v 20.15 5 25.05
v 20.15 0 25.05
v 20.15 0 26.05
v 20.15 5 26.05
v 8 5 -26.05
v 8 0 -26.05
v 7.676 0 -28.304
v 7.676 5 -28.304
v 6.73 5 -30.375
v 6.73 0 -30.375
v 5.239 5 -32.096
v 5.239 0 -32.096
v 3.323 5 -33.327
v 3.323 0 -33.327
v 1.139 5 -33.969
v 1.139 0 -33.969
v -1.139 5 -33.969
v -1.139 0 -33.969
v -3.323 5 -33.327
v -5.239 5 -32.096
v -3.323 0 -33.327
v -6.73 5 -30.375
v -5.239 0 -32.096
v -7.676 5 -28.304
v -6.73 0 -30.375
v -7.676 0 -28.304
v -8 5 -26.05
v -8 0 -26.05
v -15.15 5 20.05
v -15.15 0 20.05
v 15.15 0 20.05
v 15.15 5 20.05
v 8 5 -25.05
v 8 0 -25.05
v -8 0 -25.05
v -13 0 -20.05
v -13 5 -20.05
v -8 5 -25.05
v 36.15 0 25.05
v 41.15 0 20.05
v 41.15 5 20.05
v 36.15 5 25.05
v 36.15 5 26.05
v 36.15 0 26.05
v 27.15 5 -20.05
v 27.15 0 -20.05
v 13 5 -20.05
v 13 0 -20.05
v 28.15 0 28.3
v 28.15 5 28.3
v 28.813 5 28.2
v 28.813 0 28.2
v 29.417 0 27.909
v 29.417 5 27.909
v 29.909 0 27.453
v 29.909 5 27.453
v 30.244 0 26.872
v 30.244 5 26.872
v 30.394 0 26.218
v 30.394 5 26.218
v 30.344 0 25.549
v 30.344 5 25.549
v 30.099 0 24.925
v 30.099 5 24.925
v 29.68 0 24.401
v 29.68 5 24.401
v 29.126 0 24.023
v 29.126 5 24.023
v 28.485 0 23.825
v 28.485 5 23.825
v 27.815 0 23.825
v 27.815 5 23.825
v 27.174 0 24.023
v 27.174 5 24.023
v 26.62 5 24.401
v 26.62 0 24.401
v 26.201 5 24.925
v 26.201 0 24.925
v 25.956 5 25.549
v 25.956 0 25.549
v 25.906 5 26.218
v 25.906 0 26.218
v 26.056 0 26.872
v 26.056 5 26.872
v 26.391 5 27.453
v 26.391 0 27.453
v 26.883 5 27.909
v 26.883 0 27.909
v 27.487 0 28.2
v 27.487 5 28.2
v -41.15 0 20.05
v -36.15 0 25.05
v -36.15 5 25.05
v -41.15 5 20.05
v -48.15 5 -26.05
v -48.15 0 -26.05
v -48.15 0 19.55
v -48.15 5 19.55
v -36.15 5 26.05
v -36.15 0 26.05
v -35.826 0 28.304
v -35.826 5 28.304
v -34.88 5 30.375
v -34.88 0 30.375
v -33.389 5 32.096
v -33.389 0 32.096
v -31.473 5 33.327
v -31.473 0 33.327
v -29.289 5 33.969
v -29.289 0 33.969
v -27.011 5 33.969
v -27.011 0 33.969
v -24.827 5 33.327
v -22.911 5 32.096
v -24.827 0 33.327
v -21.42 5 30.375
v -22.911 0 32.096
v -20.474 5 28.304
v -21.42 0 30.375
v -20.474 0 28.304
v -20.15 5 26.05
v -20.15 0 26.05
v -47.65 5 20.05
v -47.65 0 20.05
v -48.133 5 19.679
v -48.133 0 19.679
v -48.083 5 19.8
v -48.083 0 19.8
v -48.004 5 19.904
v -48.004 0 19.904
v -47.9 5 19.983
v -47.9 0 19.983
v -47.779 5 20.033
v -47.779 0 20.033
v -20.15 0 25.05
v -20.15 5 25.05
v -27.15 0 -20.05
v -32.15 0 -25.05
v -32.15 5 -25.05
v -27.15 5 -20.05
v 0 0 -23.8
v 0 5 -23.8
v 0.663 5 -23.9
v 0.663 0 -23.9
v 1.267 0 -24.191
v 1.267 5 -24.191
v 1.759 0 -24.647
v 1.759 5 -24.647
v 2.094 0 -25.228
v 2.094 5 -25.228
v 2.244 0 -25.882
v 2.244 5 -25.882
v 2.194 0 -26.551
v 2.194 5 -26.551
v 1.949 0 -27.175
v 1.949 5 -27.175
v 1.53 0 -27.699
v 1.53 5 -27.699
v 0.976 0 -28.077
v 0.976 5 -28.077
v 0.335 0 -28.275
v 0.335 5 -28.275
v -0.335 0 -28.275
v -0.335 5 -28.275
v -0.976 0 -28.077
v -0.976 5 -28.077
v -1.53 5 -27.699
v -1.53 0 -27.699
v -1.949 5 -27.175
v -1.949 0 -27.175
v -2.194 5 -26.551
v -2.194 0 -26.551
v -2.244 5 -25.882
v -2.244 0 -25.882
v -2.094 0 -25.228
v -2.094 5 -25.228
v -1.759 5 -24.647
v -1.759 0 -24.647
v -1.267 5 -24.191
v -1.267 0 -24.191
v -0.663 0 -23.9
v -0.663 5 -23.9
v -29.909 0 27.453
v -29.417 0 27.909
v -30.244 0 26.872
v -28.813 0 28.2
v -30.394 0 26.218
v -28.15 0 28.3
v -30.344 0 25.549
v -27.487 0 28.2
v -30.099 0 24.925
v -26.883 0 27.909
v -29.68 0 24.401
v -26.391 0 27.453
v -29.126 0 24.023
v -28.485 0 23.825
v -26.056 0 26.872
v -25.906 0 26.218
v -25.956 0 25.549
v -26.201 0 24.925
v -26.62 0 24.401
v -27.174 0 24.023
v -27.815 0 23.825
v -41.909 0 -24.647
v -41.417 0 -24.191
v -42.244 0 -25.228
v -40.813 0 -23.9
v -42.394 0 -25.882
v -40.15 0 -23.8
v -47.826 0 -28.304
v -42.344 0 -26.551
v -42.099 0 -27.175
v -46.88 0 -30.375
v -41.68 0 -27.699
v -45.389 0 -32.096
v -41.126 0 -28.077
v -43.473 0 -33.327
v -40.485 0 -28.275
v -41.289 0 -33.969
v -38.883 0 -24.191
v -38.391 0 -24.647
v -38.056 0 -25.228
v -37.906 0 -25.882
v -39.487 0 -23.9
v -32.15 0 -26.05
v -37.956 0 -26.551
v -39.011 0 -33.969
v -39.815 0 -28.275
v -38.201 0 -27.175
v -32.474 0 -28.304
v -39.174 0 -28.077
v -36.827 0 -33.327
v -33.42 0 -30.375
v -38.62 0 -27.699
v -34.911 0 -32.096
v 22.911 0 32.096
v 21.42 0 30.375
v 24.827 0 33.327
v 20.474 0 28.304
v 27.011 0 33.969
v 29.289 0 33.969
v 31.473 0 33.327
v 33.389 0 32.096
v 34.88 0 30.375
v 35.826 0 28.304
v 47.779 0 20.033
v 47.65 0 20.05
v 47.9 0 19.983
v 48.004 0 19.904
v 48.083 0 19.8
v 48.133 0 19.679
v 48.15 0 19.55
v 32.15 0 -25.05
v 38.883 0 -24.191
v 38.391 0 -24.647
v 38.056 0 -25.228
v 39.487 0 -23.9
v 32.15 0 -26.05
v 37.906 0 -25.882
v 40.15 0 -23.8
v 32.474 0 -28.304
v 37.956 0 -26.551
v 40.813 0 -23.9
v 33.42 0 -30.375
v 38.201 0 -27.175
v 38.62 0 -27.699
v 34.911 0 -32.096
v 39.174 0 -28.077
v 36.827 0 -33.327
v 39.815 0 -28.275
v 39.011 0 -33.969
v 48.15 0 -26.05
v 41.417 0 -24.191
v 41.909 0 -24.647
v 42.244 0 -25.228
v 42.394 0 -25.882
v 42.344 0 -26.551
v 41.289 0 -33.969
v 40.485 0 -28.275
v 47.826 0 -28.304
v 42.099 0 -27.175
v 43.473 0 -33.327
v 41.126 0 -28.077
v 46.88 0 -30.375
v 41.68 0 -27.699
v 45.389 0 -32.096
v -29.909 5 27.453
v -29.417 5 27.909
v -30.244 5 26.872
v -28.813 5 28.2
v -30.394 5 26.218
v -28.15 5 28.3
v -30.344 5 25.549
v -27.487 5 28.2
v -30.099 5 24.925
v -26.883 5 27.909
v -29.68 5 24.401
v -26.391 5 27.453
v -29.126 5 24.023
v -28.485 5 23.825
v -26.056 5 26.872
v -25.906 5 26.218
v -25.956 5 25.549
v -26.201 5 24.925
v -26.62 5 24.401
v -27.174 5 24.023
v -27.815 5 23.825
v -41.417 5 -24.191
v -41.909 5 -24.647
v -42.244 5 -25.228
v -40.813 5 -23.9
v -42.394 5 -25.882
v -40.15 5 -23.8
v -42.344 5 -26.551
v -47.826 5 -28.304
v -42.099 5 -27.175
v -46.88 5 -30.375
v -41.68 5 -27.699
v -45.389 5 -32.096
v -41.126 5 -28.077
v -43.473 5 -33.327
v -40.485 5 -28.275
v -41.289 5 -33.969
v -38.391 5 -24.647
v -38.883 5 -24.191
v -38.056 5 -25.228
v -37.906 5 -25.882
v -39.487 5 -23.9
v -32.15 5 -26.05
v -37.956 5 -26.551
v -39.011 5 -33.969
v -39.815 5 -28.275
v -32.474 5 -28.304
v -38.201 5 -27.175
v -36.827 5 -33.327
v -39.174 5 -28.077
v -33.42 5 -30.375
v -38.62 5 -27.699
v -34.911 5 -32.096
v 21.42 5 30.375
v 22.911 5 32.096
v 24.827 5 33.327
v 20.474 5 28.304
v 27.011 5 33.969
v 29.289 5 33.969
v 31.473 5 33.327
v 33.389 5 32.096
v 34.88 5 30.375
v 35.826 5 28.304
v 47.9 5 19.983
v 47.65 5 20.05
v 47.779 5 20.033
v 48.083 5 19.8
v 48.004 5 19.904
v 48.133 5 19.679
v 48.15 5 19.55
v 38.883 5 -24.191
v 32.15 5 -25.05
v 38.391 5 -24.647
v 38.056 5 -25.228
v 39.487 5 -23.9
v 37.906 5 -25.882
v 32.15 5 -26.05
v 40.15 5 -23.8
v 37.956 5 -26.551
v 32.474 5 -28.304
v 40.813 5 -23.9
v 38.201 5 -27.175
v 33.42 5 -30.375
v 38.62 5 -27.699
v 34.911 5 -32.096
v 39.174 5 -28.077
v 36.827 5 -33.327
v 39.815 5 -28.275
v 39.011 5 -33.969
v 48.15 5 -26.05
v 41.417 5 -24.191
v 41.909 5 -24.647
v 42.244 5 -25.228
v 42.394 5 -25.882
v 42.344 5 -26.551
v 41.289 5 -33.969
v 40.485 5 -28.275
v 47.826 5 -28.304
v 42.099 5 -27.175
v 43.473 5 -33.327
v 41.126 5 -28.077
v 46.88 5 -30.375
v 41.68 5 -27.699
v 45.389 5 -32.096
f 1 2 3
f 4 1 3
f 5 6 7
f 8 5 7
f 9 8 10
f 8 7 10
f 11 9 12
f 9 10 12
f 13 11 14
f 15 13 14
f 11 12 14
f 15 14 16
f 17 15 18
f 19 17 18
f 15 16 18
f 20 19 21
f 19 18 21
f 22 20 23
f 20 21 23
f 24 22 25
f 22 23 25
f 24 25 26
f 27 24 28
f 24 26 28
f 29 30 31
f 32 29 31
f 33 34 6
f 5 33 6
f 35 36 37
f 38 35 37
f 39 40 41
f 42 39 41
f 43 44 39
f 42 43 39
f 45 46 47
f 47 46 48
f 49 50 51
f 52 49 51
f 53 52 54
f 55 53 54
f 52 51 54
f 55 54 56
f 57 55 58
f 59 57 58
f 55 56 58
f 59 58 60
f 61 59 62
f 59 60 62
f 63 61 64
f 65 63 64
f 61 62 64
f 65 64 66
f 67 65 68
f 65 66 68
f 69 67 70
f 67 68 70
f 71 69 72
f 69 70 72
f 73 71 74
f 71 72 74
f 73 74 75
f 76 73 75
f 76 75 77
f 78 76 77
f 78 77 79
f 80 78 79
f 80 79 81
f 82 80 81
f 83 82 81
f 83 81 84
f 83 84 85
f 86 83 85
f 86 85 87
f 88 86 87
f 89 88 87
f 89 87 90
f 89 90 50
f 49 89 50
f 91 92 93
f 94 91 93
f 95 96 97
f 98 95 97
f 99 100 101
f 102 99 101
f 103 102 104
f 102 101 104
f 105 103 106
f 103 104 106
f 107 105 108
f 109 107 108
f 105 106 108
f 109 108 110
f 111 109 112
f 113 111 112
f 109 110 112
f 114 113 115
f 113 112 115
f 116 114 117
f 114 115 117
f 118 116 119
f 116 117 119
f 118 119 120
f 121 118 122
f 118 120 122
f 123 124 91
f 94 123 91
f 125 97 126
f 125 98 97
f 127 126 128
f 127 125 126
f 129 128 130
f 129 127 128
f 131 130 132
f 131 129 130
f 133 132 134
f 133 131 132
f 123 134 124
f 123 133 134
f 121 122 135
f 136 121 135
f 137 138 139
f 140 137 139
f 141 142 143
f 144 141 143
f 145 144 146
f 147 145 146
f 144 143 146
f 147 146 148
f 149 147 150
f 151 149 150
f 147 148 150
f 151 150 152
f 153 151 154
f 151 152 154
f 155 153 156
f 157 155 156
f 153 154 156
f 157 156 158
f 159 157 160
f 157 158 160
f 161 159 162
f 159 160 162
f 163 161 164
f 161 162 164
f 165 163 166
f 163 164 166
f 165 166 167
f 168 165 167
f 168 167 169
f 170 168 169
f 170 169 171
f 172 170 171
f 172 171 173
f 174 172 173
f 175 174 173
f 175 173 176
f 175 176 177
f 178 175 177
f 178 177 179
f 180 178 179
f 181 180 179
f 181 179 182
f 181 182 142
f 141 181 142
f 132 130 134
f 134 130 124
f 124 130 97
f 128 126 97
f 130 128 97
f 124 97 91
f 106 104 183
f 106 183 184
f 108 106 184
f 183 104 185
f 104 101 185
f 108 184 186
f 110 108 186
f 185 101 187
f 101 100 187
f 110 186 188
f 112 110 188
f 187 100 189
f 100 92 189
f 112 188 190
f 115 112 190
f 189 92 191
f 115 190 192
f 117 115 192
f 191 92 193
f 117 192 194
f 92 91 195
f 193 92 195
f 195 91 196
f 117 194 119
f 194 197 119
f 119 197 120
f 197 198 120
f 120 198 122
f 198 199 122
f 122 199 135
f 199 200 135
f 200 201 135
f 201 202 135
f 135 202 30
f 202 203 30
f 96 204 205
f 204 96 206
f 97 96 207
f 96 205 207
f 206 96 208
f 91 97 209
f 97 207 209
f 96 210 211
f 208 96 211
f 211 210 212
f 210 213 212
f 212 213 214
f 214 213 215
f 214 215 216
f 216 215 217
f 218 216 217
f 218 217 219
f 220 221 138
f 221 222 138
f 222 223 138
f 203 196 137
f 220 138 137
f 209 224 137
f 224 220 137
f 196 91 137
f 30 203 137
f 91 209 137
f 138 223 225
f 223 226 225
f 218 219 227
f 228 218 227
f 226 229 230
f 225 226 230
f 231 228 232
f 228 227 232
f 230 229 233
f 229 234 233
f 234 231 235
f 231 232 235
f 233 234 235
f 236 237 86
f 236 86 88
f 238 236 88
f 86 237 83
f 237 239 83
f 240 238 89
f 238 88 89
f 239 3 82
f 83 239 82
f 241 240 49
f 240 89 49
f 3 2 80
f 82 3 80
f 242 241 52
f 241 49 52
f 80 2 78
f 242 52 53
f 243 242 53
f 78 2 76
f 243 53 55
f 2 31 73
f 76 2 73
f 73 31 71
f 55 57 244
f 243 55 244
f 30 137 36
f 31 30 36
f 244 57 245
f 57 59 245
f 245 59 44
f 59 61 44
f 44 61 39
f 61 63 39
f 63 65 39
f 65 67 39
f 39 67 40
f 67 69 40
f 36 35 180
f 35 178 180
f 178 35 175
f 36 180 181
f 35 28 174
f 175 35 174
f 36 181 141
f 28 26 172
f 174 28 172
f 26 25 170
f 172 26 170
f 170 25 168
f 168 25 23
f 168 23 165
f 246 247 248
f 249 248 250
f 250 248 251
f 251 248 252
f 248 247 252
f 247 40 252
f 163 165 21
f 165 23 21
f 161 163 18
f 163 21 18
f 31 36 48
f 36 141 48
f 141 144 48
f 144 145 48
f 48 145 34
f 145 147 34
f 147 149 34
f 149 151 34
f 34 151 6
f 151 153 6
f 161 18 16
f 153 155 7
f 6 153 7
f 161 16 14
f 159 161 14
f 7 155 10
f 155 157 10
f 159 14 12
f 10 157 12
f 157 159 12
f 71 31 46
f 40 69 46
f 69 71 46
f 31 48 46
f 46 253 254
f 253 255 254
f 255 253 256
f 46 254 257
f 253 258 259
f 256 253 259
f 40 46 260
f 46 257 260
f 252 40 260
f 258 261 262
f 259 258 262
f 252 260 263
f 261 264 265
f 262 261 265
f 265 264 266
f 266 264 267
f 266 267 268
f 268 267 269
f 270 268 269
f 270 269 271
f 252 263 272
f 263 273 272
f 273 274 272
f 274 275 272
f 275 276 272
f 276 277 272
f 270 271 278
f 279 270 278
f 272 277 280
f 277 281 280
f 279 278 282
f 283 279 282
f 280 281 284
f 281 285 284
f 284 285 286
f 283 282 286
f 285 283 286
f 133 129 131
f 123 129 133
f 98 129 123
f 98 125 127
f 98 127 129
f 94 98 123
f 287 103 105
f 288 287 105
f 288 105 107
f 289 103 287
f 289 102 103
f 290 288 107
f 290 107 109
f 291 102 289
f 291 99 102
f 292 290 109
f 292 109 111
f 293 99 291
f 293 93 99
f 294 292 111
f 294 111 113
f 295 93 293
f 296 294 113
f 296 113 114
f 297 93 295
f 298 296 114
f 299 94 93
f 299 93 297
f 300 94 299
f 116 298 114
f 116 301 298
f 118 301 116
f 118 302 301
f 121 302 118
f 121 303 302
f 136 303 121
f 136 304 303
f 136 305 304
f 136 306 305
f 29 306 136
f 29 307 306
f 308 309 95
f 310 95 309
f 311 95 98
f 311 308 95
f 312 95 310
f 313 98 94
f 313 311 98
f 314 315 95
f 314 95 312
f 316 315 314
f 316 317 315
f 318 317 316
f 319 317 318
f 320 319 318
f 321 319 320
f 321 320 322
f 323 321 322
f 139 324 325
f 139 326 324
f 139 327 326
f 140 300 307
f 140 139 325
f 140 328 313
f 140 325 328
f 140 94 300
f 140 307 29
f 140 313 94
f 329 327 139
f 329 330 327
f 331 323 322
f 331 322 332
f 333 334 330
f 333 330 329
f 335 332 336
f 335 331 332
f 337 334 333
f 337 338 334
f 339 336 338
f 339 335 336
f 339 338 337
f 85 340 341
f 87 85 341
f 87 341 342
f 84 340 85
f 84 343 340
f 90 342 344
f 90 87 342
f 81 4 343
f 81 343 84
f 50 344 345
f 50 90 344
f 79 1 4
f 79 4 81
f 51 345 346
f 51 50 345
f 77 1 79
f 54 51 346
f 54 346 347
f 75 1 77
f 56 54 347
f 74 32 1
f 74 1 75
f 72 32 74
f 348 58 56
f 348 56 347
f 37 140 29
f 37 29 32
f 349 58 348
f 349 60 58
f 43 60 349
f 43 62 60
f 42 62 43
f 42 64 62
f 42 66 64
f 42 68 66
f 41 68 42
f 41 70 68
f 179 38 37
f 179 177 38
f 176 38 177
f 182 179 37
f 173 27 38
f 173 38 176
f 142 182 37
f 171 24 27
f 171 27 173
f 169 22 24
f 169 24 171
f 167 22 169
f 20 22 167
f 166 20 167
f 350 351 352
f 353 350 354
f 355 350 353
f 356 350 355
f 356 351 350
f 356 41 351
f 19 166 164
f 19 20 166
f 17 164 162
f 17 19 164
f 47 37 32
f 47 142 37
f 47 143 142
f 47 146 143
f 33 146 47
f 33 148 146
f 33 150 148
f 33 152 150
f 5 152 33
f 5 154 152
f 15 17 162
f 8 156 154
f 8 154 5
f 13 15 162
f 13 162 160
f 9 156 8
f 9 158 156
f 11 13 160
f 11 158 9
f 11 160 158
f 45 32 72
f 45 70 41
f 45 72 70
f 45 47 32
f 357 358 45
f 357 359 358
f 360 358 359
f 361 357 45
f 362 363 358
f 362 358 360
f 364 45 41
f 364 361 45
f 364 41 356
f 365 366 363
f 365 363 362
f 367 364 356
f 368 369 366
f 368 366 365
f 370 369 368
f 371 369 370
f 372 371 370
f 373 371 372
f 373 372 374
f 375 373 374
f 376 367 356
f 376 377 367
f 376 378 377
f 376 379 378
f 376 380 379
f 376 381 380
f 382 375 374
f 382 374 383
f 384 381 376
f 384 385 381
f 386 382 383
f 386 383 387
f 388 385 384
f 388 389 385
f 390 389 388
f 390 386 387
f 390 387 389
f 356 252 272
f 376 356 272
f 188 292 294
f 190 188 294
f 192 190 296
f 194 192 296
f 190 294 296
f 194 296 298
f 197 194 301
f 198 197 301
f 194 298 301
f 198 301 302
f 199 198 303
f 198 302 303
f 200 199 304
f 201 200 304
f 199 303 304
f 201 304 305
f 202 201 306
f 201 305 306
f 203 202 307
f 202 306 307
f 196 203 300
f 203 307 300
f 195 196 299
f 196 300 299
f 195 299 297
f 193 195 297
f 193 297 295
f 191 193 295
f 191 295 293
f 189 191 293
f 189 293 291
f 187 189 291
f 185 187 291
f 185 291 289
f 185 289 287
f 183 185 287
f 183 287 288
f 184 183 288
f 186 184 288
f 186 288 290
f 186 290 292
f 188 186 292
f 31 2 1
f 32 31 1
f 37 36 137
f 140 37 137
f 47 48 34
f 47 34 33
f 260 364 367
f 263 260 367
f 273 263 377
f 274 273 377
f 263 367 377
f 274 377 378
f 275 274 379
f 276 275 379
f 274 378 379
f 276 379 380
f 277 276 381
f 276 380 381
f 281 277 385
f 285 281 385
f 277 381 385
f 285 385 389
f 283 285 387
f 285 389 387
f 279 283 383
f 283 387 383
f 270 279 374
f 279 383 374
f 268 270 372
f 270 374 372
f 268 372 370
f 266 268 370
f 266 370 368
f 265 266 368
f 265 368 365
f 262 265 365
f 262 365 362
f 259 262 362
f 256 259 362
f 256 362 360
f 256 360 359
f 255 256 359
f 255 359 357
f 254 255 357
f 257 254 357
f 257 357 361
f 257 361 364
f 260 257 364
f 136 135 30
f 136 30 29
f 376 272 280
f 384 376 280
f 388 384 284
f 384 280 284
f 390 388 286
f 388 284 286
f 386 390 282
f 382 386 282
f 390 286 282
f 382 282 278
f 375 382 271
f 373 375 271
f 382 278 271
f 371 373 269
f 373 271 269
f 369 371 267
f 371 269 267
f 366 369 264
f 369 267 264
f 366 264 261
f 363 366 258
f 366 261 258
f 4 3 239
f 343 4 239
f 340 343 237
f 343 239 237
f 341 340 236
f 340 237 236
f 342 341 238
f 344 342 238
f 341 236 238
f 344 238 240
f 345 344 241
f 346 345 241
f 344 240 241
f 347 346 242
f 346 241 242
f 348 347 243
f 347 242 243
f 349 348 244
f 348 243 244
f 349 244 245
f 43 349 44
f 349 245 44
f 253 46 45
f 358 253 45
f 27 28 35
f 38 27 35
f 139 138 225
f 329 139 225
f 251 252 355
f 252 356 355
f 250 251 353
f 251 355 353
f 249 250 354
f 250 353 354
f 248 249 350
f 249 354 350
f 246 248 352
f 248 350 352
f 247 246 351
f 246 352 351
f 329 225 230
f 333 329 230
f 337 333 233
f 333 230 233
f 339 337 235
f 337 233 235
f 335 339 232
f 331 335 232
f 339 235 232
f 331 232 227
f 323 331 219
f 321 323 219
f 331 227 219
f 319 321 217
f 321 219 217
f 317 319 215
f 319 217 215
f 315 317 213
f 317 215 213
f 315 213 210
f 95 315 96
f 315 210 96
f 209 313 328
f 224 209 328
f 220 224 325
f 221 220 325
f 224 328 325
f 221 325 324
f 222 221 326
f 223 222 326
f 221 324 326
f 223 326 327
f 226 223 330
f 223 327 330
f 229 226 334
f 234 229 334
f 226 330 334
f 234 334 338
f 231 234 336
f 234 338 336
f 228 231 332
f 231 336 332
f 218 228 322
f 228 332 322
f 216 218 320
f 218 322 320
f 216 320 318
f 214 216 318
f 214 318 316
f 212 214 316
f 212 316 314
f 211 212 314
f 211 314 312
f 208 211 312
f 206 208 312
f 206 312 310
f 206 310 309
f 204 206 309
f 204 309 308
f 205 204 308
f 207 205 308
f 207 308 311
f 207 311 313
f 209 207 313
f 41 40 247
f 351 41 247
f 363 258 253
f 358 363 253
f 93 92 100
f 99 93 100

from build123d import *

# Parameters (mm, degrees)
BOSS_EXTRUDE1_DEPTH  = 5
CHAMFER1_SIZE        = 5
M4_CLEARANCE_HOLE1_D = 4.5
FILLET1_R            = 0.5


with BuildPart() as part:
    # Sketch1 → Boss-Extrude1 (new body)
    with BuildSketch(Plane(origin=(0, 0, 0), x_dir=(1, 0, 0), z_dir=(0, 1, 0))):
        with BuildLine():
            Line((48.15, -20.05), (48.15, 20.05))
            Line((48.15, 20.05), (48.15, 26.05))
            ThreePointArc((48.15, 26.05), (40.15, 34.05), (32.15, 26.05))
            Line((32.15, 26.05), (32.15, 20.05))
            Line((32.15, 20.05), (8, 20.05))
            Line((8, 20.05), (8, 26.05))
            ThreePointArc((8, 26.05), (0, 34.05), (-8, 26.05))
            Line((-8, 26.05), (-8, 20.05))
            Line((-8, 20.05), (-32.15, 20.05))
            Line((-32.15, 20.05), (-32.15, 26.05))
            ThreePointArc((-32.15, 26.05), (-40.15, 34.05), (-48.15, 26.05))
            Line((-48.15, 26.05), (-48.15, 20.05))
            Line((-48.15, 20.05), (-48.15, -20.05))
            Line((-48.15, -20.05), (-36.15, -20.05))
            Line((-36.15, -20.05), (-36.15, -26.05))
            ThreePointArc((-36.15, -26.05), (-28.15, -34.05), (-20.15, -26.05))
            Line((-20.15, -26.05), (-20.15, -20.05))
            Line((-20.15, -20.05), (20.15, -20.05))
            Line((20.15, -20.05), (20.15, -26.05))
            ThreePointArc((20.15, -26.05), (28.15, -34.05), (36.15, -26.05))
            Line((36.15, -26.05), (36.15, -20.05))
            Line((36.15, -20.05), (48.15, -20.05))
        make_face()
    extrude(amount=BOSS_EXTRUDE1_DEPTH)

    # Chamfer1
    chamfer1_edges = [part.edges().sort_by_distance(p)[0] for p in [
        (36.15, 2.5, 20.05),
        (20.15, 2.5, 20.05),
        (-20.15, 2.5, 20.05),
        (-36.15, 2.5, 20.05),
        (-32.15, 2.5, -20.05),
        (-8, 2.5, -20.05),
        (8, 2.5, -20.05),
        (32.15, 2.5, -20.05),
    ]]
    chamfer(chamfer1_edges, length=CHAMFER1_SIZE)

    # M4 Clearance Hole1 (through all)
    with Locations(Plane(origin=(28.15, 0, 26.05), x_dir=(0, 0, -1), z_dir=(0, -1, 0))):
        with Locations((0, 0), (52.1, -68.3), (52.1, -28.15), (52.1, 12), (0, -56.3)):
            Hole(M4_CLEARANCE_HOLE1_D / 2)

    # Fillet1
    fillet1_edges = [part.edges().sort_by_distance(p)[0] for p in [
        (-48.15, 2.5, 20.05),
        (48.15, 2.5, 20.05),
    ]]
    fillet(fillet1_edges, radius=FILLET1_R)


solid = part.part
